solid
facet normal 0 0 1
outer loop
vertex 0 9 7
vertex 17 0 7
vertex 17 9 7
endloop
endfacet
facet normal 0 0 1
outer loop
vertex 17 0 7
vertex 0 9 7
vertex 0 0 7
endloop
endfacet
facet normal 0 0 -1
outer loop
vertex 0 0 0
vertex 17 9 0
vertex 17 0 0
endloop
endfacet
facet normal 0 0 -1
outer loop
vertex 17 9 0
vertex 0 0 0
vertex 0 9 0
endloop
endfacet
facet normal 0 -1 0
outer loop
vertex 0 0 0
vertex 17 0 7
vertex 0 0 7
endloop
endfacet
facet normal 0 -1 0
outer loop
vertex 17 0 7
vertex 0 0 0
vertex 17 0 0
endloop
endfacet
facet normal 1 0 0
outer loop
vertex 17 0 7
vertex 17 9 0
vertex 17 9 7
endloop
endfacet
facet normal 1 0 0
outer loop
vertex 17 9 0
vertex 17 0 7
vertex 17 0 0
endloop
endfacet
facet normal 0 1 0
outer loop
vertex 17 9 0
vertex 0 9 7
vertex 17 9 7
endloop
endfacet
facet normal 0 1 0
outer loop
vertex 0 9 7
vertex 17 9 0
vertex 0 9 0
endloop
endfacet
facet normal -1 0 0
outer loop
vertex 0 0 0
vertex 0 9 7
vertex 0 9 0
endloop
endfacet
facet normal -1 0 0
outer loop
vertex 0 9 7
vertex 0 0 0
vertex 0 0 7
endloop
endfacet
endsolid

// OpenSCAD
// Generated by SolidPython 1.0.1 on 2020-07-29 00:46:56


cube(size = [17, 9, 7]);
/***********************************************
*********      SolidPython code:      **********
************************************************
 
# import packages: SolidPython
from solid import *
from solid.utils import *
from itertools import chain, combinations, permutations


class Resize:

    def __init__(self, scad_file):
        self.scad_file = scad_file
        #self.scad_file = import_scad(scad_file)
        # cone/cylinder param:
        self.r1 = 0
        self.r2 = 0
        self.h = 0
        # rectangular prism param:
        self.w = 0
        self.l = 0
        # ellipse param:
        self.r = 0

    # import OpenScad code (file name corresponds to shape)


    # classify shape + parameters
    def assign(self, param1, param2, param3):
        if self.scad_file == 'cone.scad':
            self.r1 = param1
            self.r2 = param2
            self.h = param3
        elif self.scad_file == 'cylinder.scad':
            self.r1 = param1
            self.r2 = param2
            self.h = param3
        elif self.scad_file == 'rectangularPrism.scad':
            self.h = param1
            self.l = param2
            self.w = param3
        else:
            self.r = param1
            self.h = param2

    # resize parameters
    def iterate(self):
        x = range(3, 20, 2)
        i = 1
        if self.scad_file == 'cone.scad':
            tempList = list(permutations(x, 2))
            for temp in tempList:
                param1 = temp[0]
                param2 = temp[1]
                filepath = 'produced_scad_files/' + 'cone' + str(param1) + '_' + str(param2) + '_' + '.scad'
                scad_render_to_file(cylinder(h=param1, r1=param2, r2=0), filepath)

        elif self.scad_file == 'cylinder.scad':
            tempList = list(permutations(x, 3))
            for temp in tempList:
                param1 = temp[0]
                param2 = temp[1]
                filepath = 'produced_scad_files/' + 'cylinder' + str(param1) + '_' + str(param2) + '_' + '.scad'
                scad_render_to_file(cylinder(h=param1, r1=param2, r2=param2), filepath)

        elif self.scad_file == 'rectangularPrism.scad':
            tempList = list(permutations(x, 3))
            for temp in tempList:
                param1 = temp[0]
                param2 = temp[1]
                param3 = temp[2]
                filepath = 'produced_scad_files/' + 'rectangularPrism' + str(param1) + '_' + str(param2) + '_' + str(
                    param3) + '.scad'
                scad_render_to_file(cube(size=(param1, param2, param3)), filepath)

        elif self.scad_file == 'ellipse.scad':
            tempList = list(permutations(x, 4))
            for temp in tempList:
                param1 = temp[0]
                param2 = temp[1]
                param3 = temp[2]
                param4 = temp[3]
                filepath = 'produced_scad_files/' + 'ellipse' + str(param1) + '_' + str(param2) + '_' + str(param3) + '_' + str(param4) + '.scad'
                scad_render_to_file(scale([param1, param2, param3])(sphere(r=param4)), filepath)

    def render_to_scadfile(self):
        scad_render_to_file(scad, 'example.scad') 
 
************************************************/
